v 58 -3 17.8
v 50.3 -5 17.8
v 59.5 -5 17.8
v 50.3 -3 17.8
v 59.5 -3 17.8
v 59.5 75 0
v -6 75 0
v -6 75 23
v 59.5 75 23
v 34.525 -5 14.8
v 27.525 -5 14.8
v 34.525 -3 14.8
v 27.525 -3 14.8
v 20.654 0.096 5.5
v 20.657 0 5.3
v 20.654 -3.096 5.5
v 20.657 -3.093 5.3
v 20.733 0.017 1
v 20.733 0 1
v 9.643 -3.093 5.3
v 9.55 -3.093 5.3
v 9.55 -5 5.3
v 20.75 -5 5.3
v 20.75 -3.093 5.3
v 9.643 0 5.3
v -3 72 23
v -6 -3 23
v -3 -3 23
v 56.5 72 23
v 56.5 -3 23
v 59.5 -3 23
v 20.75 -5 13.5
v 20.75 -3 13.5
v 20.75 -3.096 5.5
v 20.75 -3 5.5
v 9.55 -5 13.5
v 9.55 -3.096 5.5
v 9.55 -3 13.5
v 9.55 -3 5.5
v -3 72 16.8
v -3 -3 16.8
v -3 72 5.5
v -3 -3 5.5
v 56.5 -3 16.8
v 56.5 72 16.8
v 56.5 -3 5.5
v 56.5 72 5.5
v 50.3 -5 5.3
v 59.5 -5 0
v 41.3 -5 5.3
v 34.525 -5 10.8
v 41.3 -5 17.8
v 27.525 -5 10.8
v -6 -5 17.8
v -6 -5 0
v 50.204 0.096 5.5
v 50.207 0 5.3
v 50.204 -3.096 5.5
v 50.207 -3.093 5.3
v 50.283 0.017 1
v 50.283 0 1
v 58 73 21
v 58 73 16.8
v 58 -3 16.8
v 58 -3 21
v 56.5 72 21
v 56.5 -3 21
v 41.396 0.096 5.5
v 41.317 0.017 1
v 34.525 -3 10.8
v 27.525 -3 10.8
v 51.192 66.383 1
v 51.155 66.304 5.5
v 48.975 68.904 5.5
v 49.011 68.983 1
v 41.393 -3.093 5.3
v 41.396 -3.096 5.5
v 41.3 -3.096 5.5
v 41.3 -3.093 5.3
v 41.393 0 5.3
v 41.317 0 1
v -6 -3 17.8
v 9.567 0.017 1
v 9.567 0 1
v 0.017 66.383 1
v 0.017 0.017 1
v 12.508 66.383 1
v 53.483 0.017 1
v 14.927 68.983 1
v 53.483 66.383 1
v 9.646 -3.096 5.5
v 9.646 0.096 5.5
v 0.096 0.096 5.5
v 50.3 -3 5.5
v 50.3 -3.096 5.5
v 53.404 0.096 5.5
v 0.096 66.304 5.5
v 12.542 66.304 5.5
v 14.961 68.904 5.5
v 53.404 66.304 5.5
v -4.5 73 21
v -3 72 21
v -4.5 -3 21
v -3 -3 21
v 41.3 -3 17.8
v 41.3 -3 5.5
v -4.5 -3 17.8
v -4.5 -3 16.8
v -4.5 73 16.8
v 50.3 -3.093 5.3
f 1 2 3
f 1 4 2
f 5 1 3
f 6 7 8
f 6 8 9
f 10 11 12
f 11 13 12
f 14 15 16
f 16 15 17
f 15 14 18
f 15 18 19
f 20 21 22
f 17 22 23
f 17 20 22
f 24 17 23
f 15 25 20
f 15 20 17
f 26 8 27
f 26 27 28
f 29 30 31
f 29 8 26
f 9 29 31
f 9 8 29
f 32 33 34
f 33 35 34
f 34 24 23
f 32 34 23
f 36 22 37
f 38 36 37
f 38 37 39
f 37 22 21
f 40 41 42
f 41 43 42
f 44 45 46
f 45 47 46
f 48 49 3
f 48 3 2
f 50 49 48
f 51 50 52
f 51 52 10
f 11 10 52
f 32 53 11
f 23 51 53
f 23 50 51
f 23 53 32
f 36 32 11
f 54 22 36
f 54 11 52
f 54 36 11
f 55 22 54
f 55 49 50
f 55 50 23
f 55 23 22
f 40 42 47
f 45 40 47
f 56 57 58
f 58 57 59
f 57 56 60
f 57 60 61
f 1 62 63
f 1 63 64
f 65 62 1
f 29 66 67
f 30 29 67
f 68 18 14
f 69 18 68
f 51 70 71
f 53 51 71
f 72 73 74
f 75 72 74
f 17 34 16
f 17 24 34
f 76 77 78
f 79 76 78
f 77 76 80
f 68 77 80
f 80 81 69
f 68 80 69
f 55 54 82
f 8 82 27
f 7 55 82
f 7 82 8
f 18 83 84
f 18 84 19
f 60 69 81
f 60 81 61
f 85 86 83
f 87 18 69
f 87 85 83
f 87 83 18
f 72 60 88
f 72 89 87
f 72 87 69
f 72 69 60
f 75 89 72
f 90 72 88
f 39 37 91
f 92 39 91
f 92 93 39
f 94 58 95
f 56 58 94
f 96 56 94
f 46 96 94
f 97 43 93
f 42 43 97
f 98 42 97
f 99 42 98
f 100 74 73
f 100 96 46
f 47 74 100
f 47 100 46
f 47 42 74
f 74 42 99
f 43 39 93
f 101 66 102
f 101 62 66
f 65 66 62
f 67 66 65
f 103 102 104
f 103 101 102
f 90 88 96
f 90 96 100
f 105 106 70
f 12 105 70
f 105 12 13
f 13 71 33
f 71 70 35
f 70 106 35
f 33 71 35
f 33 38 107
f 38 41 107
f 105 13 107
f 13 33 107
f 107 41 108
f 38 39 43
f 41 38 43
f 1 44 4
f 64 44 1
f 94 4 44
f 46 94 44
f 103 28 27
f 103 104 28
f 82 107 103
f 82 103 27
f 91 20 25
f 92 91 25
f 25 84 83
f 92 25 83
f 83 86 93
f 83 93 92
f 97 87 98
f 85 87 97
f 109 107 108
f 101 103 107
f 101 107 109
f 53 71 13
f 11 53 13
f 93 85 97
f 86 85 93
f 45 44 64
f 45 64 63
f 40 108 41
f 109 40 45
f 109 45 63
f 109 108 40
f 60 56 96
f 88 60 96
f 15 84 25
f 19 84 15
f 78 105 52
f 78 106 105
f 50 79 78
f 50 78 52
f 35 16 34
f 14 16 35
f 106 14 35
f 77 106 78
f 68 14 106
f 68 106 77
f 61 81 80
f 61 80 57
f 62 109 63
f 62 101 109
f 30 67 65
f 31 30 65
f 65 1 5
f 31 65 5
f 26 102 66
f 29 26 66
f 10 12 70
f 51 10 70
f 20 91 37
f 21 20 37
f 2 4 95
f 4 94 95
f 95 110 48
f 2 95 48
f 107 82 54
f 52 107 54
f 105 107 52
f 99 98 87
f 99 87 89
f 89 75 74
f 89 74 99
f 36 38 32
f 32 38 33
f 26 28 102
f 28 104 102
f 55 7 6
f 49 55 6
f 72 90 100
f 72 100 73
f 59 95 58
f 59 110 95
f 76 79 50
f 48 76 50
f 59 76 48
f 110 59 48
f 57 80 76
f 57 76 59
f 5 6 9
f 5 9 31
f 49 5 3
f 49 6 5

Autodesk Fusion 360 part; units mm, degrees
sketch "Esquisse1" plane through (0, 0, 0) normal (0, 0, 1) x (1, 0, 0)
  line L0 (0, 0) -> (53.5, 0)
  line L1 (53.5, 0) -> (53.5, 66.4)
  line L2 (0, 66.4) -> (0, 0)
  line L3 (41.3, 0) -> (50.3, 0)
  line L4 (50.3, 0) -> (50.3, -5.2)
  line L5 (50.3, -5.2) -> (41.3, -5.2)
  line L6 (41.3, -5.2) -> (41.3, 0)
  line L7 (11.5, 0) -> (18.8, 0)
  line L8 (18.8, 0) -> (18.8, -1.2)
  line L9 (18.8, -1.2) -> (11.5, -1.2)
  line L10 (11.5, -1.2) -> (11.5, 0)
  line L11 (53.5, 66.4) -> (51.2, 66.4) construction
  line L12 (51.2, 66.4) -> (49.0195, 69)
  line L13 (49.0195, 69) -> (14.9195, 69)
  line L14 (12.5, 66.4) -> (14.9195, 69)
  line L15 (53.5, 66.4) -> (51.2, 66.4)
  line L16 (12.5, 66.4) -> (0, 66.4)
  line L17 (41.3, 0) -> (49.9, 0)
  line L18 (11.5, 0) -> (18.8, 0)
  line L19 (0, 33.2) -> (53.5, 33.2) construction
  line L20 (26.75, 0) -> (26.75, 33.2) construction
  line L21 (0, 66.4) -> (0, 68.7) construction
  line L22 (0, 68.7) -> (53.5, 68.7) construction
  line L23 (53.5, 68.7) -> (53.5, 66.4) construction
  line L24 (-3, 72) -> (56.5, 72)
  line L25 (56.5, 72) -> (56.5, -3)
  line L26 (56.5, -3) -> (-3, -3)
  line L27 (-3, -3) -> (-3, 72)
  line L28 (-6, 75) -> (59.5, 75)
  line L29 (59.5, 75) -> (59.5, -5)
  line L30 (59.5, -5) -> (-6, -5)
  line L31 (-6, -5) -> (-6, 75)
  line L32 (26.75, 75) -> (26.75, -5) construction
  line L33 (11.5, -1.2) -> (11.5, -5)
  line L34 (18.8, -1.2) -> (18.8, -5)
  line L35 (15.15, 0) -> (15.15, -5) construction
  line L36 (9.55, 0) -> (20.75, 0)
  line L37 (20.75, 0) -> (20.75, -5)
  line L38 (20.75, -5) -> (9.55, -5)
  line L39 (9.55, -5) -> (9.55, 0)
  line L40 (15.15, 0) -> (15.15, -5) construction
  line L41 (-3, -3) -> (-6, -3)
  line L42 (56.5, -3) -> (59.5, -3)
  dimension "d1" = 66.4
  dimension "d13" = 53.5
  dimension "d14" = 3.2
  dimension "d15" = 9
  dimension "d16" = 5.2
  dimension "d17" = 11.5
  dimension "d18" = 7.3
  dimension "d19" = 1.2
  dimension "d21" = 2.3
  dimension "d22" = 38.7
  dimension "d25" = 34.1
  dimension "d43" = 3
  dimension "d44" = 3
  dimension "d45" = 3
  dimension "d46" = 3
  dimension "d47" = 3
  dimension "d48" = 3
  dimension "d52" = 11.2
extrude "Extrusion6" add sketch "Esquisse1" along normal blind 1 contours L0 L1 L2 L3 L7 L12 L13 L14 L15 L16 L17 L18 L36
extrude "Extrusion7" add sketch "Esquisse1" along normal blind 5.5 draft 1 contours L0 L1 L2 L4 L12 L13 L14 L15 L16 L24 L25 L26 L27 L39 | L0 L6 L26 L37
extrude "Extrusion8" add sketch "Esquisse1" along normal blind 23 contours L24 L25 L27 L28 L29 L31 L41 L42
extrude "Extrusion9" add sketch "Esquisse1" along normal blind 4.5 contours L0 L10 L26 L33 L36 L39 | L0 L7 L8 L9 L10 L18 L36 | L26 L30 L33 L38 L39 | L0 L8 L26 L34 L36 L37 | L9 L26 L33 L34 | L26 L30 L33 L34 L38 | L26 L30 L34 L37 L38 | L0 L3 L4 L6 L17 L26 | L4 L6 L26 L30
extrude "Extrusion10" add sketch "Esquisse1" along normal blind 17.8 contours L26 L30 L31 L39 L41 | L6 L26 L30 L37 | L4 L26 L29 L30 L42
sketch "Esquisse2" plane through (-3, 0, 0) normal (1, 0, 0) x (0, 1, 0)
  line L0 (-3, 5.5) -> (72, 5.5)
  line L1 (72, 5.5) -> (72, 23)
  line L2 (72, 23) -> (-3, 23)
  line L3 (-3, 23) -> (-3, 17.8)
  line L4 (-3, 17.8) -> (-3, 5.5)
  line L5 (-3, 23) -> (75, 23) construction
  line L6 (-3, 21) -> (72.5, 21)
  line L7 (72.5, 21) -> (72.5, 16.8)
  line L8 (72.5, 16.8) -> (-3, 16.8)
  line L9 (-3, 16.8) -> (-3, 21)
  dimension "d65" = 2
  dimension "d66" = 4.2
  dimension "d67" = 75.5
extrude "Extrusion11" cut sketch "Esquisse2" against normal blind 1.5 contours L1 L3 L4 L6 L8 L9
sketch "Esquisse3" plane through (56.5, 0, 0) normal (-1, 0, 0) x (0, -1, 0)
  line L0 (-72, 5.5) -> (3, 5.5)
  line L1 (3, 5.5) -> (3, 17.8)
  line L2 (3, 17.8) -> (3, 23)
  line L3 (3, 23) -> (-72, 23)
  line L4 (-72, 23) -> (-72, 5.5)
  line L5 (-72, 23) -> (3, 23) construction
  line L6 (-72, 21) -> (3, 21)
  line L7 (3, 21) -> (3, 16.8)
  line L8 (3, 16.8) -> (-72, 16.8)
  line L9 (-72, 16.8) -> (-72, 21)
  dimension "d70" = 4.2
  dimension "d71" = 2
extrude "Extrusion12" cut sketch "Esquisse3" against normal blind 1.5 contours L1 L2 L4 L6 L7 L8 L9
sketch "Esquisse4" plane through (0, 72, 0) normal (0, -1, 0) x (1, 0, 0)
  line L0 (-3, 5.5) -> (56.5, 5.5)
  line L1 (56.5, 5.5) -> (56.5, 16.8)
  line L2 (56.5, 16.8) -> (58, 16.8)
  line L3 (58, 16.8) -> (58, 21)
  line L4 (58, 21) -> (56.5, 21)
  line L5 (56.5, 21) -> (56.5, 23)
  line L6 (56.5, 23) -> (-3, 23)
  line L7 (-3, 23) -> (-3, 21)
  line L8 (-3, 21) -> (-4.5, 21)
  line L9 (-4.5, 21) -> (-4.5, 16.8)
  line L10 (-4.5, 16.8) -> (-3, 16.8)
  line L11 (-3, 16.8) -> (-3, 5.5)
  line L12 (-4.5, 21) -> (58, 21)
  line L13 (58, 21) -> (58, 16.8)
  line L14 (58, 16.8) -> (-4.5, 16.8)
  line L15 (-4.5, 16.8) -> (-4.5, 21)
extrude "Extrusion13" add 2 faces at (47.2738, -2.0524, 4.5) (16.9905, -1.0262, 4.5) along direction (0, 0, 1) blind 0.8
sketch "Esquisse5" plane through (0, -3, 0) normal (0, 1, 0) x (-1, 0, 0)
  line L0 (-41.3, 5.5) -> (-20.75, 5.5)
  line L1 (-20.75, 5.5) -> (-20.75, 17.8)
  line L2 (-20.75, 17.8) -> (-41.3, 17.8)
  line L3 (-41.3, 17.8) -> (-41.3, 5.5)
  line L4 (-60.0312, 14.8) -> (4.9812, 14.8) construction
  line L5 (-50, 16) -> (-41.3, 16) construction
  line L6 (-20.75, 13.5) -> (-9.5, 13.5) construction
  line L7 (-41.3, 5.5) -> (-51, 5.5) construction
  line L8 (-51, 5.5) -> (-20.75, 5.5) construction
  line L9 (-9.284, 5.5) -> (-20.75, 5.5) construction
  line L10 (-50, 16) -> (-41.3, 16)
  line L11 (-41.3, 16) -> (-41.3, 17.8)
  line L12 (-41.3, 17.8) -> (-50, 17.8)
  line L13 (-50, 17.8) -> (-50, 16)
  line L14 (-20.75, 17.8) -> (-9.5, 17.8)
  line L15 (-9.5, 17.8) -> (-9.5, 13.5)
  line L16 (-9.5, 13.5) -> (-20.75, 13.5)
  line L17 (-20.75, 13.5) -> (-20.75, 17.8)
  line L18 (-27.525, 14.8) -> (-34.525, 14.8)
  line L19 (-34.525, 14.8) -> (-34.525, 10.8)
  line L20 (-34.525, 10.8) -> (-27.525, 10.8)
  line L21 (-27.525, 10.8) -> (-27.525, 14.8)
  line L22 (-20.75, 17.8) -> (-41.3, 17.8) construction
  line L23 (-41.3, 17.8) -> (-41.3, 5.5) construction
  line L24 (-41.3, 5.5) -> (-20.75, 5.5) construction
  line L25 (-20.75, 5.5) -> (-20.75, 17.8) construction
  line L26 (-31.025, 14.8) -> (-31.025, 10.8) construction
  line L27 (-31.025, 17.8) -> (-31.025, 5.5) construction
  dimension "d76" = 10.5
  dimension "d78" = 8
  dimension "d81" = 7
  dimension "d82" = 4
extrude "Extrusion14" add sketch "Esquisse5" against normal blind 2 contours L3 L10 L11 L12 L13 | L1 L14 L15 L16 L17
extrude "Extrusion16" cut sketch "Esquisse5" against normal blind 2 contours L18 L19 L20 L21
extrude "Extrusion17" cut sketch "Esquisse4" against normal blind 1 contours L2 L3 L4 L8 L9 L10 L12 L13 L14 L15
extrude "Extrusion19" cut 1 faces at (47.1, -3.6667, 16) along direction (0, 0, 1) blind 3
equation "d1 = longc1"
equation "longc1 = 66.4 mm" comment "longueur Carte"
equation "largc1 = 53.5 mm" comment "largueur Carte"
equation "diffdepH = 2.5 mm" comment "différence de hauteur entre la carte et la foorme du dessus"
equation "epchar = 11 mm" comment "épaisseur de l'entrée chargeur"
equation "depconn = 1.2 mm" comment "dépassement due a l'entrée usb-c"
equation "depchar = 5.2 mm" comment "dépassement du à l'entrée charqeur"
equation "larchar = 9 mm" comment "largeur de l'entrée chargeur"
equation "larconn = 7.3 mm" comment "largeur de l'entrée USB-C"
equation "distborconn = 11.5 mm" comment "distance entre l'entrée USB-C et le bord le plus proche"
equation "distborchar = 3.2 mm" comment "distance entre l'entrée chargeur et le bord le plus proche"
equation "diffdepD = 2.3 mm" comment "distance entre bordure droit  et le dépassement"
equation "d13 = largc1"
equation "d14 = distborchar"
equation "d15 = larchar"
equation "d16 = depchar"
equation "d17 = distborconn"
equation "d18 = larconn"
equation "d19 = depconn"
equation "largdep = 34.2 mm" comment "largeur du dépassement"
equation "d21 = diffdepD"
equation "epC = 4.5 mm" comment "épaisseur de la carte"
equation "epconn = 2.5 mm" comment "epaisseur entrée usb-c"
equation "diffCB = 3 mm" comment "espace entre bordure et carte"
equation "d43 = diffCB"
equation "d44 = diffCB"
equation "d45 = diffCB"
equation "d46 = diffCB"
equation "d47 = epB"
equation "d48 = epB"
equation "epB = 3 mm" comment "épaisseur de la boite"
equation "Lpu = 11.2 mm" comment "largeur de l'embout USB-c"
equation "Hpu = 8 mm" comment "Hauteur de l'embout USB-c"
equation "d52 = Lpu"
equation "d55 = 1 mm + epC"
equation "HB = 23 mm" comment "Hauteur Boite"
equation "epV = 3.2 mm" comment "épaisseur vitre"
equation "d59 = HB"
equation "d61 = epC"
equation "d63 = HB - 2 mm - epV"
equation "d66 = epV + 1 mm"
equation "d67 = 78.000001 mm - 2.5 mm"
equation "d70 = epV + 1 mm"
equation "d76 = HC"
equation "HC = 10.5 mm" comment "hauteur del'embout chargeur"
equation "d78 = Hpu"
equation "longpin = 3 mm"
